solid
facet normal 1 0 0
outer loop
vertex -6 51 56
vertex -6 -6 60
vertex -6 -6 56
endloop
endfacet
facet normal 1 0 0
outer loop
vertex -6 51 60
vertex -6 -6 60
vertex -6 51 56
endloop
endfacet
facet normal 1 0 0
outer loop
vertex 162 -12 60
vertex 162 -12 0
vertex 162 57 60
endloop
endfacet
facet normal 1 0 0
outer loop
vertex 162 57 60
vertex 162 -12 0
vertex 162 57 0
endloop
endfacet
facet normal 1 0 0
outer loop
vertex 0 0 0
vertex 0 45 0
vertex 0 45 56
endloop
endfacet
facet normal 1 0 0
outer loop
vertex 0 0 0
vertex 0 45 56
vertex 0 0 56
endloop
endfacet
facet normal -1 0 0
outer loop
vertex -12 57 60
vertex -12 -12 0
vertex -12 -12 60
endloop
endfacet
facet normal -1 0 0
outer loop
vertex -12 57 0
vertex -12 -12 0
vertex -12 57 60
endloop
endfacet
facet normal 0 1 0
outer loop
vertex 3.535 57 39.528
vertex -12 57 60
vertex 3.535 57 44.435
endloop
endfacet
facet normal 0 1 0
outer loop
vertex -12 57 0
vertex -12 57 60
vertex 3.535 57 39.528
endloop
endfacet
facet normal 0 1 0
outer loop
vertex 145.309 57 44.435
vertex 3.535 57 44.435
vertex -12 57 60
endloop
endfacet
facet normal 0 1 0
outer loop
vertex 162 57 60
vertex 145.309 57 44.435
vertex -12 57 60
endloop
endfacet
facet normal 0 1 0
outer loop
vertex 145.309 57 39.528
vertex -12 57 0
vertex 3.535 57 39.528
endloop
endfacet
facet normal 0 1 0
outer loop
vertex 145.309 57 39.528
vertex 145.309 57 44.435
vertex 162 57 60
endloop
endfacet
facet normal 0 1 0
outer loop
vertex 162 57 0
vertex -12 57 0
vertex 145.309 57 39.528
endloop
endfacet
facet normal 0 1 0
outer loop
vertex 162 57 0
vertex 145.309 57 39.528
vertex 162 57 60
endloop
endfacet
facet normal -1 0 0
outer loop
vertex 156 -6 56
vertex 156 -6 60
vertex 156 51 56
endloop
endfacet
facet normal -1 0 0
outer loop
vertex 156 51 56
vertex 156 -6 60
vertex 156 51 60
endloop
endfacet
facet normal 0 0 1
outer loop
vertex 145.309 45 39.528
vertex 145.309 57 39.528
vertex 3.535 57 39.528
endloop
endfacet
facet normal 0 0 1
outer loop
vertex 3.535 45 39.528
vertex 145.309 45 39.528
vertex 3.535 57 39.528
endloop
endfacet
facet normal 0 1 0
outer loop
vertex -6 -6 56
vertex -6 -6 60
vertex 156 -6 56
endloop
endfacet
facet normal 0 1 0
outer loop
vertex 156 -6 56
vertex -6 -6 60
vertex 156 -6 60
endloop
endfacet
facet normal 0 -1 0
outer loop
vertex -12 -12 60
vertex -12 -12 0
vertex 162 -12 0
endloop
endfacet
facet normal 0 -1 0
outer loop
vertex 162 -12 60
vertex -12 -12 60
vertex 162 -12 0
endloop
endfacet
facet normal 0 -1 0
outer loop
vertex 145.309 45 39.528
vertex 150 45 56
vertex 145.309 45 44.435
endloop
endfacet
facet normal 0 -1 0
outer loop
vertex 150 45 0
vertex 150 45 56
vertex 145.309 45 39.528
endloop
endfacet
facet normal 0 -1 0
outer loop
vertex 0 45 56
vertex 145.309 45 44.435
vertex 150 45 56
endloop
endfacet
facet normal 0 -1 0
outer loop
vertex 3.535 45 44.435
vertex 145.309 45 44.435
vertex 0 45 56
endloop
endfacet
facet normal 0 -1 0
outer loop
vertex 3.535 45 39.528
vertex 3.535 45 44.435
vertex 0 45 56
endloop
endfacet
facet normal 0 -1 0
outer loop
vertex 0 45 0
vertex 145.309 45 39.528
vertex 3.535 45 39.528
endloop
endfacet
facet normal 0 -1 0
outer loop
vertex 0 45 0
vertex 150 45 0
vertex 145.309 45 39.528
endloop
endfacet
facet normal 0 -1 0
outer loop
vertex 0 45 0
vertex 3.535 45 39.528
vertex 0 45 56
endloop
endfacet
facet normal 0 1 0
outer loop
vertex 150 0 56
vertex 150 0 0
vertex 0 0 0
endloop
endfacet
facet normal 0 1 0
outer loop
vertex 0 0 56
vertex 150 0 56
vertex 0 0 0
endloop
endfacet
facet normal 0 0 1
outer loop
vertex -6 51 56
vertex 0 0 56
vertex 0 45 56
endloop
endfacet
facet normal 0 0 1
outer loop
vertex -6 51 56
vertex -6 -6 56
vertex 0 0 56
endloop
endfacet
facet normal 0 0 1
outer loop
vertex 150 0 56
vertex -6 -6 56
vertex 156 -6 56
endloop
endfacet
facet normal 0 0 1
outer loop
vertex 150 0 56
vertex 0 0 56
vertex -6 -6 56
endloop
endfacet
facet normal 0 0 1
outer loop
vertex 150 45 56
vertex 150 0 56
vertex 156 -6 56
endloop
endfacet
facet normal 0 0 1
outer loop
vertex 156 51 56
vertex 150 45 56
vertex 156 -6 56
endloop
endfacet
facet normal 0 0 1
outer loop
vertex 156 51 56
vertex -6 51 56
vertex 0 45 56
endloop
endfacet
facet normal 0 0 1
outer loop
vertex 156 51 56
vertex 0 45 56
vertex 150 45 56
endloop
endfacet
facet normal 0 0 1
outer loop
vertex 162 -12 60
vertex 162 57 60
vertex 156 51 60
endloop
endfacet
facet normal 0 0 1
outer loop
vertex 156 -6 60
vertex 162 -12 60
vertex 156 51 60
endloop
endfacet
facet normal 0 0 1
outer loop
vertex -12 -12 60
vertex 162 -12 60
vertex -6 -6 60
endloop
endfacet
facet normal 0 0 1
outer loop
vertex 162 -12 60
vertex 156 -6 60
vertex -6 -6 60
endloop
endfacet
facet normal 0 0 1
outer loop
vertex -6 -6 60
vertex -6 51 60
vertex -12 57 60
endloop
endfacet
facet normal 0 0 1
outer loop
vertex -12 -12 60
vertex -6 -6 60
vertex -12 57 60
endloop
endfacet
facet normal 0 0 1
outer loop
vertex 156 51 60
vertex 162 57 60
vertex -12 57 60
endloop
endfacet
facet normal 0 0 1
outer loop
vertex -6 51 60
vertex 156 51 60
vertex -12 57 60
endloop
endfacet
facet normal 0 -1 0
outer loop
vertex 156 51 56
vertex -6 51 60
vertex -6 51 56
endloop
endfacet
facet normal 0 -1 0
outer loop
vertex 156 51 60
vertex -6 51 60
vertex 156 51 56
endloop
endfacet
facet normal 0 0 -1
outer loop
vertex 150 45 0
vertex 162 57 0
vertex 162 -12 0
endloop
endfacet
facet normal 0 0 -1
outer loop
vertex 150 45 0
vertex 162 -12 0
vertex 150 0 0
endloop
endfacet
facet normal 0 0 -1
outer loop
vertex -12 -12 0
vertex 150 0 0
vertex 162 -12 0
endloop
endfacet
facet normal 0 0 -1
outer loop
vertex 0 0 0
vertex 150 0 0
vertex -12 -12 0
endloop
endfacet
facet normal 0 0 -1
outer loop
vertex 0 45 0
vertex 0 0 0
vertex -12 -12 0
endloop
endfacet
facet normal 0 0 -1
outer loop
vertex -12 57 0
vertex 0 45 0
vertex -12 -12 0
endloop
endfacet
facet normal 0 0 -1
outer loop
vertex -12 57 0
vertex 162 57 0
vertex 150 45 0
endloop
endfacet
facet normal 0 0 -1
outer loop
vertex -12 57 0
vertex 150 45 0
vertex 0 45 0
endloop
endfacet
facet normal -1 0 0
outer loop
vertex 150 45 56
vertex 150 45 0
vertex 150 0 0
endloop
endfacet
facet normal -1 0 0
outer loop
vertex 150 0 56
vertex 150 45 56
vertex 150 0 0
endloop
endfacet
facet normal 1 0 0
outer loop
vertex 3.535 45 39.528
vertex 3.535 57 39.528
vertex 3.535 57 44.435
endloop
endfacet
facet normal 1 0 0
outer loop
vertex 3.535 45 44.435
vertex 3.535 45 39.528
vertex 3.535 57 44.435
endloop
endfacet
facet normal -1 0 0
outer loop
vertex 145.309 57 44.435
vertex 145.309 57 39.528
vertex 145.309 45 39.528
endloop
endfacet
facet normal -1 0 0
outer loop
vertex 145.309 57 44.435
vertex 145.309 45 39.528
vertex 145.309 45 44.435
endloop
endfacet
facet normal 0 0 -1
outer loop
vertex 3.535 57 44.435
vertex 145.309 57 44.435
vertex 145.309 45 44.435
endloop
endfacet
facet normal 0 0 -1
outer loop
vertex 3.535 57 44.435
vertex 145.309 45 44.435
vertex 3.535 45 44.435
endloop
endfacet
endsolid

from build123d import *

# Parameters (mm, degrees)
PAD_DEPTH       = 60
PAD001_DEPTH    = 60
PAD004_DEPTH    = 60
PAD006_DEPTH    = 60
SKETCH008_W     = 162
SKETCH008_H     = 57
POCKET_DEPTH    = 4
SKETCH011_W     = 141.774313
SKETCH011_H     = 4.907572
POCKET001_DEPTH = 12


with BuildPart() as part:
    # Sketch → Pad (new body)
    with BuildSketch(Plane.XY):
        Polygon((162, -12), (150, 0), (0, 0), (-12, -12), align=None)
    extrude(amount=PAD_DEPTH)

    # Sketch001 → Pad001 (join)
    with BuildSketch(Plane.XY):
        Polygon((0, 45), (0, 0), (-12, -12), (-12, 57), align=None)
    extrude(amount=PAD001_DEPTH)

    # Sketch004 → Pad004 (join)
    with BuildSketch(Plane.XY):
        Polygon((150, 0), (162, -12), (162, 57), (150, 45), align=None)
    extrude(amount=PAD004_DEPTH)

    # Sketch007 → Pad006 (join)
    with BuildSketch(Plane.XY):
        Polygon((-12, 57), (162, 57), (150, 45), (0, 45), align=None)
    extrude(amount=PAD006_DEPTH)

    # Sketch008 (on Face13 of Pad006) → Pocket (cut)
    with BuildSketch(Plane.XY.offset(60)):
        with Locations((75, 22.5)):
            Rectangle(SKETCH008_W, SKETCH008_H)
    extrude(amount=-POCKET_DEPTH, mode=Mode.SUBTRACT)

    # Sketch011 (on Face6 of Pad006) → Pocket001 (cut)
    with BuildSketch(Plane(origin=(0, 57, 0), x_dir=(-1, 0, 0), z_dir=(0, 1, 0))):
        with Locations((-74.422004, 41.981674)):
            Rectangle(SKETCH011_W, SKETCH011_H)
    extrude(amount=-POCKET001_DEPTH, mode=Mode.SUBTRACT)


solid = part.part
